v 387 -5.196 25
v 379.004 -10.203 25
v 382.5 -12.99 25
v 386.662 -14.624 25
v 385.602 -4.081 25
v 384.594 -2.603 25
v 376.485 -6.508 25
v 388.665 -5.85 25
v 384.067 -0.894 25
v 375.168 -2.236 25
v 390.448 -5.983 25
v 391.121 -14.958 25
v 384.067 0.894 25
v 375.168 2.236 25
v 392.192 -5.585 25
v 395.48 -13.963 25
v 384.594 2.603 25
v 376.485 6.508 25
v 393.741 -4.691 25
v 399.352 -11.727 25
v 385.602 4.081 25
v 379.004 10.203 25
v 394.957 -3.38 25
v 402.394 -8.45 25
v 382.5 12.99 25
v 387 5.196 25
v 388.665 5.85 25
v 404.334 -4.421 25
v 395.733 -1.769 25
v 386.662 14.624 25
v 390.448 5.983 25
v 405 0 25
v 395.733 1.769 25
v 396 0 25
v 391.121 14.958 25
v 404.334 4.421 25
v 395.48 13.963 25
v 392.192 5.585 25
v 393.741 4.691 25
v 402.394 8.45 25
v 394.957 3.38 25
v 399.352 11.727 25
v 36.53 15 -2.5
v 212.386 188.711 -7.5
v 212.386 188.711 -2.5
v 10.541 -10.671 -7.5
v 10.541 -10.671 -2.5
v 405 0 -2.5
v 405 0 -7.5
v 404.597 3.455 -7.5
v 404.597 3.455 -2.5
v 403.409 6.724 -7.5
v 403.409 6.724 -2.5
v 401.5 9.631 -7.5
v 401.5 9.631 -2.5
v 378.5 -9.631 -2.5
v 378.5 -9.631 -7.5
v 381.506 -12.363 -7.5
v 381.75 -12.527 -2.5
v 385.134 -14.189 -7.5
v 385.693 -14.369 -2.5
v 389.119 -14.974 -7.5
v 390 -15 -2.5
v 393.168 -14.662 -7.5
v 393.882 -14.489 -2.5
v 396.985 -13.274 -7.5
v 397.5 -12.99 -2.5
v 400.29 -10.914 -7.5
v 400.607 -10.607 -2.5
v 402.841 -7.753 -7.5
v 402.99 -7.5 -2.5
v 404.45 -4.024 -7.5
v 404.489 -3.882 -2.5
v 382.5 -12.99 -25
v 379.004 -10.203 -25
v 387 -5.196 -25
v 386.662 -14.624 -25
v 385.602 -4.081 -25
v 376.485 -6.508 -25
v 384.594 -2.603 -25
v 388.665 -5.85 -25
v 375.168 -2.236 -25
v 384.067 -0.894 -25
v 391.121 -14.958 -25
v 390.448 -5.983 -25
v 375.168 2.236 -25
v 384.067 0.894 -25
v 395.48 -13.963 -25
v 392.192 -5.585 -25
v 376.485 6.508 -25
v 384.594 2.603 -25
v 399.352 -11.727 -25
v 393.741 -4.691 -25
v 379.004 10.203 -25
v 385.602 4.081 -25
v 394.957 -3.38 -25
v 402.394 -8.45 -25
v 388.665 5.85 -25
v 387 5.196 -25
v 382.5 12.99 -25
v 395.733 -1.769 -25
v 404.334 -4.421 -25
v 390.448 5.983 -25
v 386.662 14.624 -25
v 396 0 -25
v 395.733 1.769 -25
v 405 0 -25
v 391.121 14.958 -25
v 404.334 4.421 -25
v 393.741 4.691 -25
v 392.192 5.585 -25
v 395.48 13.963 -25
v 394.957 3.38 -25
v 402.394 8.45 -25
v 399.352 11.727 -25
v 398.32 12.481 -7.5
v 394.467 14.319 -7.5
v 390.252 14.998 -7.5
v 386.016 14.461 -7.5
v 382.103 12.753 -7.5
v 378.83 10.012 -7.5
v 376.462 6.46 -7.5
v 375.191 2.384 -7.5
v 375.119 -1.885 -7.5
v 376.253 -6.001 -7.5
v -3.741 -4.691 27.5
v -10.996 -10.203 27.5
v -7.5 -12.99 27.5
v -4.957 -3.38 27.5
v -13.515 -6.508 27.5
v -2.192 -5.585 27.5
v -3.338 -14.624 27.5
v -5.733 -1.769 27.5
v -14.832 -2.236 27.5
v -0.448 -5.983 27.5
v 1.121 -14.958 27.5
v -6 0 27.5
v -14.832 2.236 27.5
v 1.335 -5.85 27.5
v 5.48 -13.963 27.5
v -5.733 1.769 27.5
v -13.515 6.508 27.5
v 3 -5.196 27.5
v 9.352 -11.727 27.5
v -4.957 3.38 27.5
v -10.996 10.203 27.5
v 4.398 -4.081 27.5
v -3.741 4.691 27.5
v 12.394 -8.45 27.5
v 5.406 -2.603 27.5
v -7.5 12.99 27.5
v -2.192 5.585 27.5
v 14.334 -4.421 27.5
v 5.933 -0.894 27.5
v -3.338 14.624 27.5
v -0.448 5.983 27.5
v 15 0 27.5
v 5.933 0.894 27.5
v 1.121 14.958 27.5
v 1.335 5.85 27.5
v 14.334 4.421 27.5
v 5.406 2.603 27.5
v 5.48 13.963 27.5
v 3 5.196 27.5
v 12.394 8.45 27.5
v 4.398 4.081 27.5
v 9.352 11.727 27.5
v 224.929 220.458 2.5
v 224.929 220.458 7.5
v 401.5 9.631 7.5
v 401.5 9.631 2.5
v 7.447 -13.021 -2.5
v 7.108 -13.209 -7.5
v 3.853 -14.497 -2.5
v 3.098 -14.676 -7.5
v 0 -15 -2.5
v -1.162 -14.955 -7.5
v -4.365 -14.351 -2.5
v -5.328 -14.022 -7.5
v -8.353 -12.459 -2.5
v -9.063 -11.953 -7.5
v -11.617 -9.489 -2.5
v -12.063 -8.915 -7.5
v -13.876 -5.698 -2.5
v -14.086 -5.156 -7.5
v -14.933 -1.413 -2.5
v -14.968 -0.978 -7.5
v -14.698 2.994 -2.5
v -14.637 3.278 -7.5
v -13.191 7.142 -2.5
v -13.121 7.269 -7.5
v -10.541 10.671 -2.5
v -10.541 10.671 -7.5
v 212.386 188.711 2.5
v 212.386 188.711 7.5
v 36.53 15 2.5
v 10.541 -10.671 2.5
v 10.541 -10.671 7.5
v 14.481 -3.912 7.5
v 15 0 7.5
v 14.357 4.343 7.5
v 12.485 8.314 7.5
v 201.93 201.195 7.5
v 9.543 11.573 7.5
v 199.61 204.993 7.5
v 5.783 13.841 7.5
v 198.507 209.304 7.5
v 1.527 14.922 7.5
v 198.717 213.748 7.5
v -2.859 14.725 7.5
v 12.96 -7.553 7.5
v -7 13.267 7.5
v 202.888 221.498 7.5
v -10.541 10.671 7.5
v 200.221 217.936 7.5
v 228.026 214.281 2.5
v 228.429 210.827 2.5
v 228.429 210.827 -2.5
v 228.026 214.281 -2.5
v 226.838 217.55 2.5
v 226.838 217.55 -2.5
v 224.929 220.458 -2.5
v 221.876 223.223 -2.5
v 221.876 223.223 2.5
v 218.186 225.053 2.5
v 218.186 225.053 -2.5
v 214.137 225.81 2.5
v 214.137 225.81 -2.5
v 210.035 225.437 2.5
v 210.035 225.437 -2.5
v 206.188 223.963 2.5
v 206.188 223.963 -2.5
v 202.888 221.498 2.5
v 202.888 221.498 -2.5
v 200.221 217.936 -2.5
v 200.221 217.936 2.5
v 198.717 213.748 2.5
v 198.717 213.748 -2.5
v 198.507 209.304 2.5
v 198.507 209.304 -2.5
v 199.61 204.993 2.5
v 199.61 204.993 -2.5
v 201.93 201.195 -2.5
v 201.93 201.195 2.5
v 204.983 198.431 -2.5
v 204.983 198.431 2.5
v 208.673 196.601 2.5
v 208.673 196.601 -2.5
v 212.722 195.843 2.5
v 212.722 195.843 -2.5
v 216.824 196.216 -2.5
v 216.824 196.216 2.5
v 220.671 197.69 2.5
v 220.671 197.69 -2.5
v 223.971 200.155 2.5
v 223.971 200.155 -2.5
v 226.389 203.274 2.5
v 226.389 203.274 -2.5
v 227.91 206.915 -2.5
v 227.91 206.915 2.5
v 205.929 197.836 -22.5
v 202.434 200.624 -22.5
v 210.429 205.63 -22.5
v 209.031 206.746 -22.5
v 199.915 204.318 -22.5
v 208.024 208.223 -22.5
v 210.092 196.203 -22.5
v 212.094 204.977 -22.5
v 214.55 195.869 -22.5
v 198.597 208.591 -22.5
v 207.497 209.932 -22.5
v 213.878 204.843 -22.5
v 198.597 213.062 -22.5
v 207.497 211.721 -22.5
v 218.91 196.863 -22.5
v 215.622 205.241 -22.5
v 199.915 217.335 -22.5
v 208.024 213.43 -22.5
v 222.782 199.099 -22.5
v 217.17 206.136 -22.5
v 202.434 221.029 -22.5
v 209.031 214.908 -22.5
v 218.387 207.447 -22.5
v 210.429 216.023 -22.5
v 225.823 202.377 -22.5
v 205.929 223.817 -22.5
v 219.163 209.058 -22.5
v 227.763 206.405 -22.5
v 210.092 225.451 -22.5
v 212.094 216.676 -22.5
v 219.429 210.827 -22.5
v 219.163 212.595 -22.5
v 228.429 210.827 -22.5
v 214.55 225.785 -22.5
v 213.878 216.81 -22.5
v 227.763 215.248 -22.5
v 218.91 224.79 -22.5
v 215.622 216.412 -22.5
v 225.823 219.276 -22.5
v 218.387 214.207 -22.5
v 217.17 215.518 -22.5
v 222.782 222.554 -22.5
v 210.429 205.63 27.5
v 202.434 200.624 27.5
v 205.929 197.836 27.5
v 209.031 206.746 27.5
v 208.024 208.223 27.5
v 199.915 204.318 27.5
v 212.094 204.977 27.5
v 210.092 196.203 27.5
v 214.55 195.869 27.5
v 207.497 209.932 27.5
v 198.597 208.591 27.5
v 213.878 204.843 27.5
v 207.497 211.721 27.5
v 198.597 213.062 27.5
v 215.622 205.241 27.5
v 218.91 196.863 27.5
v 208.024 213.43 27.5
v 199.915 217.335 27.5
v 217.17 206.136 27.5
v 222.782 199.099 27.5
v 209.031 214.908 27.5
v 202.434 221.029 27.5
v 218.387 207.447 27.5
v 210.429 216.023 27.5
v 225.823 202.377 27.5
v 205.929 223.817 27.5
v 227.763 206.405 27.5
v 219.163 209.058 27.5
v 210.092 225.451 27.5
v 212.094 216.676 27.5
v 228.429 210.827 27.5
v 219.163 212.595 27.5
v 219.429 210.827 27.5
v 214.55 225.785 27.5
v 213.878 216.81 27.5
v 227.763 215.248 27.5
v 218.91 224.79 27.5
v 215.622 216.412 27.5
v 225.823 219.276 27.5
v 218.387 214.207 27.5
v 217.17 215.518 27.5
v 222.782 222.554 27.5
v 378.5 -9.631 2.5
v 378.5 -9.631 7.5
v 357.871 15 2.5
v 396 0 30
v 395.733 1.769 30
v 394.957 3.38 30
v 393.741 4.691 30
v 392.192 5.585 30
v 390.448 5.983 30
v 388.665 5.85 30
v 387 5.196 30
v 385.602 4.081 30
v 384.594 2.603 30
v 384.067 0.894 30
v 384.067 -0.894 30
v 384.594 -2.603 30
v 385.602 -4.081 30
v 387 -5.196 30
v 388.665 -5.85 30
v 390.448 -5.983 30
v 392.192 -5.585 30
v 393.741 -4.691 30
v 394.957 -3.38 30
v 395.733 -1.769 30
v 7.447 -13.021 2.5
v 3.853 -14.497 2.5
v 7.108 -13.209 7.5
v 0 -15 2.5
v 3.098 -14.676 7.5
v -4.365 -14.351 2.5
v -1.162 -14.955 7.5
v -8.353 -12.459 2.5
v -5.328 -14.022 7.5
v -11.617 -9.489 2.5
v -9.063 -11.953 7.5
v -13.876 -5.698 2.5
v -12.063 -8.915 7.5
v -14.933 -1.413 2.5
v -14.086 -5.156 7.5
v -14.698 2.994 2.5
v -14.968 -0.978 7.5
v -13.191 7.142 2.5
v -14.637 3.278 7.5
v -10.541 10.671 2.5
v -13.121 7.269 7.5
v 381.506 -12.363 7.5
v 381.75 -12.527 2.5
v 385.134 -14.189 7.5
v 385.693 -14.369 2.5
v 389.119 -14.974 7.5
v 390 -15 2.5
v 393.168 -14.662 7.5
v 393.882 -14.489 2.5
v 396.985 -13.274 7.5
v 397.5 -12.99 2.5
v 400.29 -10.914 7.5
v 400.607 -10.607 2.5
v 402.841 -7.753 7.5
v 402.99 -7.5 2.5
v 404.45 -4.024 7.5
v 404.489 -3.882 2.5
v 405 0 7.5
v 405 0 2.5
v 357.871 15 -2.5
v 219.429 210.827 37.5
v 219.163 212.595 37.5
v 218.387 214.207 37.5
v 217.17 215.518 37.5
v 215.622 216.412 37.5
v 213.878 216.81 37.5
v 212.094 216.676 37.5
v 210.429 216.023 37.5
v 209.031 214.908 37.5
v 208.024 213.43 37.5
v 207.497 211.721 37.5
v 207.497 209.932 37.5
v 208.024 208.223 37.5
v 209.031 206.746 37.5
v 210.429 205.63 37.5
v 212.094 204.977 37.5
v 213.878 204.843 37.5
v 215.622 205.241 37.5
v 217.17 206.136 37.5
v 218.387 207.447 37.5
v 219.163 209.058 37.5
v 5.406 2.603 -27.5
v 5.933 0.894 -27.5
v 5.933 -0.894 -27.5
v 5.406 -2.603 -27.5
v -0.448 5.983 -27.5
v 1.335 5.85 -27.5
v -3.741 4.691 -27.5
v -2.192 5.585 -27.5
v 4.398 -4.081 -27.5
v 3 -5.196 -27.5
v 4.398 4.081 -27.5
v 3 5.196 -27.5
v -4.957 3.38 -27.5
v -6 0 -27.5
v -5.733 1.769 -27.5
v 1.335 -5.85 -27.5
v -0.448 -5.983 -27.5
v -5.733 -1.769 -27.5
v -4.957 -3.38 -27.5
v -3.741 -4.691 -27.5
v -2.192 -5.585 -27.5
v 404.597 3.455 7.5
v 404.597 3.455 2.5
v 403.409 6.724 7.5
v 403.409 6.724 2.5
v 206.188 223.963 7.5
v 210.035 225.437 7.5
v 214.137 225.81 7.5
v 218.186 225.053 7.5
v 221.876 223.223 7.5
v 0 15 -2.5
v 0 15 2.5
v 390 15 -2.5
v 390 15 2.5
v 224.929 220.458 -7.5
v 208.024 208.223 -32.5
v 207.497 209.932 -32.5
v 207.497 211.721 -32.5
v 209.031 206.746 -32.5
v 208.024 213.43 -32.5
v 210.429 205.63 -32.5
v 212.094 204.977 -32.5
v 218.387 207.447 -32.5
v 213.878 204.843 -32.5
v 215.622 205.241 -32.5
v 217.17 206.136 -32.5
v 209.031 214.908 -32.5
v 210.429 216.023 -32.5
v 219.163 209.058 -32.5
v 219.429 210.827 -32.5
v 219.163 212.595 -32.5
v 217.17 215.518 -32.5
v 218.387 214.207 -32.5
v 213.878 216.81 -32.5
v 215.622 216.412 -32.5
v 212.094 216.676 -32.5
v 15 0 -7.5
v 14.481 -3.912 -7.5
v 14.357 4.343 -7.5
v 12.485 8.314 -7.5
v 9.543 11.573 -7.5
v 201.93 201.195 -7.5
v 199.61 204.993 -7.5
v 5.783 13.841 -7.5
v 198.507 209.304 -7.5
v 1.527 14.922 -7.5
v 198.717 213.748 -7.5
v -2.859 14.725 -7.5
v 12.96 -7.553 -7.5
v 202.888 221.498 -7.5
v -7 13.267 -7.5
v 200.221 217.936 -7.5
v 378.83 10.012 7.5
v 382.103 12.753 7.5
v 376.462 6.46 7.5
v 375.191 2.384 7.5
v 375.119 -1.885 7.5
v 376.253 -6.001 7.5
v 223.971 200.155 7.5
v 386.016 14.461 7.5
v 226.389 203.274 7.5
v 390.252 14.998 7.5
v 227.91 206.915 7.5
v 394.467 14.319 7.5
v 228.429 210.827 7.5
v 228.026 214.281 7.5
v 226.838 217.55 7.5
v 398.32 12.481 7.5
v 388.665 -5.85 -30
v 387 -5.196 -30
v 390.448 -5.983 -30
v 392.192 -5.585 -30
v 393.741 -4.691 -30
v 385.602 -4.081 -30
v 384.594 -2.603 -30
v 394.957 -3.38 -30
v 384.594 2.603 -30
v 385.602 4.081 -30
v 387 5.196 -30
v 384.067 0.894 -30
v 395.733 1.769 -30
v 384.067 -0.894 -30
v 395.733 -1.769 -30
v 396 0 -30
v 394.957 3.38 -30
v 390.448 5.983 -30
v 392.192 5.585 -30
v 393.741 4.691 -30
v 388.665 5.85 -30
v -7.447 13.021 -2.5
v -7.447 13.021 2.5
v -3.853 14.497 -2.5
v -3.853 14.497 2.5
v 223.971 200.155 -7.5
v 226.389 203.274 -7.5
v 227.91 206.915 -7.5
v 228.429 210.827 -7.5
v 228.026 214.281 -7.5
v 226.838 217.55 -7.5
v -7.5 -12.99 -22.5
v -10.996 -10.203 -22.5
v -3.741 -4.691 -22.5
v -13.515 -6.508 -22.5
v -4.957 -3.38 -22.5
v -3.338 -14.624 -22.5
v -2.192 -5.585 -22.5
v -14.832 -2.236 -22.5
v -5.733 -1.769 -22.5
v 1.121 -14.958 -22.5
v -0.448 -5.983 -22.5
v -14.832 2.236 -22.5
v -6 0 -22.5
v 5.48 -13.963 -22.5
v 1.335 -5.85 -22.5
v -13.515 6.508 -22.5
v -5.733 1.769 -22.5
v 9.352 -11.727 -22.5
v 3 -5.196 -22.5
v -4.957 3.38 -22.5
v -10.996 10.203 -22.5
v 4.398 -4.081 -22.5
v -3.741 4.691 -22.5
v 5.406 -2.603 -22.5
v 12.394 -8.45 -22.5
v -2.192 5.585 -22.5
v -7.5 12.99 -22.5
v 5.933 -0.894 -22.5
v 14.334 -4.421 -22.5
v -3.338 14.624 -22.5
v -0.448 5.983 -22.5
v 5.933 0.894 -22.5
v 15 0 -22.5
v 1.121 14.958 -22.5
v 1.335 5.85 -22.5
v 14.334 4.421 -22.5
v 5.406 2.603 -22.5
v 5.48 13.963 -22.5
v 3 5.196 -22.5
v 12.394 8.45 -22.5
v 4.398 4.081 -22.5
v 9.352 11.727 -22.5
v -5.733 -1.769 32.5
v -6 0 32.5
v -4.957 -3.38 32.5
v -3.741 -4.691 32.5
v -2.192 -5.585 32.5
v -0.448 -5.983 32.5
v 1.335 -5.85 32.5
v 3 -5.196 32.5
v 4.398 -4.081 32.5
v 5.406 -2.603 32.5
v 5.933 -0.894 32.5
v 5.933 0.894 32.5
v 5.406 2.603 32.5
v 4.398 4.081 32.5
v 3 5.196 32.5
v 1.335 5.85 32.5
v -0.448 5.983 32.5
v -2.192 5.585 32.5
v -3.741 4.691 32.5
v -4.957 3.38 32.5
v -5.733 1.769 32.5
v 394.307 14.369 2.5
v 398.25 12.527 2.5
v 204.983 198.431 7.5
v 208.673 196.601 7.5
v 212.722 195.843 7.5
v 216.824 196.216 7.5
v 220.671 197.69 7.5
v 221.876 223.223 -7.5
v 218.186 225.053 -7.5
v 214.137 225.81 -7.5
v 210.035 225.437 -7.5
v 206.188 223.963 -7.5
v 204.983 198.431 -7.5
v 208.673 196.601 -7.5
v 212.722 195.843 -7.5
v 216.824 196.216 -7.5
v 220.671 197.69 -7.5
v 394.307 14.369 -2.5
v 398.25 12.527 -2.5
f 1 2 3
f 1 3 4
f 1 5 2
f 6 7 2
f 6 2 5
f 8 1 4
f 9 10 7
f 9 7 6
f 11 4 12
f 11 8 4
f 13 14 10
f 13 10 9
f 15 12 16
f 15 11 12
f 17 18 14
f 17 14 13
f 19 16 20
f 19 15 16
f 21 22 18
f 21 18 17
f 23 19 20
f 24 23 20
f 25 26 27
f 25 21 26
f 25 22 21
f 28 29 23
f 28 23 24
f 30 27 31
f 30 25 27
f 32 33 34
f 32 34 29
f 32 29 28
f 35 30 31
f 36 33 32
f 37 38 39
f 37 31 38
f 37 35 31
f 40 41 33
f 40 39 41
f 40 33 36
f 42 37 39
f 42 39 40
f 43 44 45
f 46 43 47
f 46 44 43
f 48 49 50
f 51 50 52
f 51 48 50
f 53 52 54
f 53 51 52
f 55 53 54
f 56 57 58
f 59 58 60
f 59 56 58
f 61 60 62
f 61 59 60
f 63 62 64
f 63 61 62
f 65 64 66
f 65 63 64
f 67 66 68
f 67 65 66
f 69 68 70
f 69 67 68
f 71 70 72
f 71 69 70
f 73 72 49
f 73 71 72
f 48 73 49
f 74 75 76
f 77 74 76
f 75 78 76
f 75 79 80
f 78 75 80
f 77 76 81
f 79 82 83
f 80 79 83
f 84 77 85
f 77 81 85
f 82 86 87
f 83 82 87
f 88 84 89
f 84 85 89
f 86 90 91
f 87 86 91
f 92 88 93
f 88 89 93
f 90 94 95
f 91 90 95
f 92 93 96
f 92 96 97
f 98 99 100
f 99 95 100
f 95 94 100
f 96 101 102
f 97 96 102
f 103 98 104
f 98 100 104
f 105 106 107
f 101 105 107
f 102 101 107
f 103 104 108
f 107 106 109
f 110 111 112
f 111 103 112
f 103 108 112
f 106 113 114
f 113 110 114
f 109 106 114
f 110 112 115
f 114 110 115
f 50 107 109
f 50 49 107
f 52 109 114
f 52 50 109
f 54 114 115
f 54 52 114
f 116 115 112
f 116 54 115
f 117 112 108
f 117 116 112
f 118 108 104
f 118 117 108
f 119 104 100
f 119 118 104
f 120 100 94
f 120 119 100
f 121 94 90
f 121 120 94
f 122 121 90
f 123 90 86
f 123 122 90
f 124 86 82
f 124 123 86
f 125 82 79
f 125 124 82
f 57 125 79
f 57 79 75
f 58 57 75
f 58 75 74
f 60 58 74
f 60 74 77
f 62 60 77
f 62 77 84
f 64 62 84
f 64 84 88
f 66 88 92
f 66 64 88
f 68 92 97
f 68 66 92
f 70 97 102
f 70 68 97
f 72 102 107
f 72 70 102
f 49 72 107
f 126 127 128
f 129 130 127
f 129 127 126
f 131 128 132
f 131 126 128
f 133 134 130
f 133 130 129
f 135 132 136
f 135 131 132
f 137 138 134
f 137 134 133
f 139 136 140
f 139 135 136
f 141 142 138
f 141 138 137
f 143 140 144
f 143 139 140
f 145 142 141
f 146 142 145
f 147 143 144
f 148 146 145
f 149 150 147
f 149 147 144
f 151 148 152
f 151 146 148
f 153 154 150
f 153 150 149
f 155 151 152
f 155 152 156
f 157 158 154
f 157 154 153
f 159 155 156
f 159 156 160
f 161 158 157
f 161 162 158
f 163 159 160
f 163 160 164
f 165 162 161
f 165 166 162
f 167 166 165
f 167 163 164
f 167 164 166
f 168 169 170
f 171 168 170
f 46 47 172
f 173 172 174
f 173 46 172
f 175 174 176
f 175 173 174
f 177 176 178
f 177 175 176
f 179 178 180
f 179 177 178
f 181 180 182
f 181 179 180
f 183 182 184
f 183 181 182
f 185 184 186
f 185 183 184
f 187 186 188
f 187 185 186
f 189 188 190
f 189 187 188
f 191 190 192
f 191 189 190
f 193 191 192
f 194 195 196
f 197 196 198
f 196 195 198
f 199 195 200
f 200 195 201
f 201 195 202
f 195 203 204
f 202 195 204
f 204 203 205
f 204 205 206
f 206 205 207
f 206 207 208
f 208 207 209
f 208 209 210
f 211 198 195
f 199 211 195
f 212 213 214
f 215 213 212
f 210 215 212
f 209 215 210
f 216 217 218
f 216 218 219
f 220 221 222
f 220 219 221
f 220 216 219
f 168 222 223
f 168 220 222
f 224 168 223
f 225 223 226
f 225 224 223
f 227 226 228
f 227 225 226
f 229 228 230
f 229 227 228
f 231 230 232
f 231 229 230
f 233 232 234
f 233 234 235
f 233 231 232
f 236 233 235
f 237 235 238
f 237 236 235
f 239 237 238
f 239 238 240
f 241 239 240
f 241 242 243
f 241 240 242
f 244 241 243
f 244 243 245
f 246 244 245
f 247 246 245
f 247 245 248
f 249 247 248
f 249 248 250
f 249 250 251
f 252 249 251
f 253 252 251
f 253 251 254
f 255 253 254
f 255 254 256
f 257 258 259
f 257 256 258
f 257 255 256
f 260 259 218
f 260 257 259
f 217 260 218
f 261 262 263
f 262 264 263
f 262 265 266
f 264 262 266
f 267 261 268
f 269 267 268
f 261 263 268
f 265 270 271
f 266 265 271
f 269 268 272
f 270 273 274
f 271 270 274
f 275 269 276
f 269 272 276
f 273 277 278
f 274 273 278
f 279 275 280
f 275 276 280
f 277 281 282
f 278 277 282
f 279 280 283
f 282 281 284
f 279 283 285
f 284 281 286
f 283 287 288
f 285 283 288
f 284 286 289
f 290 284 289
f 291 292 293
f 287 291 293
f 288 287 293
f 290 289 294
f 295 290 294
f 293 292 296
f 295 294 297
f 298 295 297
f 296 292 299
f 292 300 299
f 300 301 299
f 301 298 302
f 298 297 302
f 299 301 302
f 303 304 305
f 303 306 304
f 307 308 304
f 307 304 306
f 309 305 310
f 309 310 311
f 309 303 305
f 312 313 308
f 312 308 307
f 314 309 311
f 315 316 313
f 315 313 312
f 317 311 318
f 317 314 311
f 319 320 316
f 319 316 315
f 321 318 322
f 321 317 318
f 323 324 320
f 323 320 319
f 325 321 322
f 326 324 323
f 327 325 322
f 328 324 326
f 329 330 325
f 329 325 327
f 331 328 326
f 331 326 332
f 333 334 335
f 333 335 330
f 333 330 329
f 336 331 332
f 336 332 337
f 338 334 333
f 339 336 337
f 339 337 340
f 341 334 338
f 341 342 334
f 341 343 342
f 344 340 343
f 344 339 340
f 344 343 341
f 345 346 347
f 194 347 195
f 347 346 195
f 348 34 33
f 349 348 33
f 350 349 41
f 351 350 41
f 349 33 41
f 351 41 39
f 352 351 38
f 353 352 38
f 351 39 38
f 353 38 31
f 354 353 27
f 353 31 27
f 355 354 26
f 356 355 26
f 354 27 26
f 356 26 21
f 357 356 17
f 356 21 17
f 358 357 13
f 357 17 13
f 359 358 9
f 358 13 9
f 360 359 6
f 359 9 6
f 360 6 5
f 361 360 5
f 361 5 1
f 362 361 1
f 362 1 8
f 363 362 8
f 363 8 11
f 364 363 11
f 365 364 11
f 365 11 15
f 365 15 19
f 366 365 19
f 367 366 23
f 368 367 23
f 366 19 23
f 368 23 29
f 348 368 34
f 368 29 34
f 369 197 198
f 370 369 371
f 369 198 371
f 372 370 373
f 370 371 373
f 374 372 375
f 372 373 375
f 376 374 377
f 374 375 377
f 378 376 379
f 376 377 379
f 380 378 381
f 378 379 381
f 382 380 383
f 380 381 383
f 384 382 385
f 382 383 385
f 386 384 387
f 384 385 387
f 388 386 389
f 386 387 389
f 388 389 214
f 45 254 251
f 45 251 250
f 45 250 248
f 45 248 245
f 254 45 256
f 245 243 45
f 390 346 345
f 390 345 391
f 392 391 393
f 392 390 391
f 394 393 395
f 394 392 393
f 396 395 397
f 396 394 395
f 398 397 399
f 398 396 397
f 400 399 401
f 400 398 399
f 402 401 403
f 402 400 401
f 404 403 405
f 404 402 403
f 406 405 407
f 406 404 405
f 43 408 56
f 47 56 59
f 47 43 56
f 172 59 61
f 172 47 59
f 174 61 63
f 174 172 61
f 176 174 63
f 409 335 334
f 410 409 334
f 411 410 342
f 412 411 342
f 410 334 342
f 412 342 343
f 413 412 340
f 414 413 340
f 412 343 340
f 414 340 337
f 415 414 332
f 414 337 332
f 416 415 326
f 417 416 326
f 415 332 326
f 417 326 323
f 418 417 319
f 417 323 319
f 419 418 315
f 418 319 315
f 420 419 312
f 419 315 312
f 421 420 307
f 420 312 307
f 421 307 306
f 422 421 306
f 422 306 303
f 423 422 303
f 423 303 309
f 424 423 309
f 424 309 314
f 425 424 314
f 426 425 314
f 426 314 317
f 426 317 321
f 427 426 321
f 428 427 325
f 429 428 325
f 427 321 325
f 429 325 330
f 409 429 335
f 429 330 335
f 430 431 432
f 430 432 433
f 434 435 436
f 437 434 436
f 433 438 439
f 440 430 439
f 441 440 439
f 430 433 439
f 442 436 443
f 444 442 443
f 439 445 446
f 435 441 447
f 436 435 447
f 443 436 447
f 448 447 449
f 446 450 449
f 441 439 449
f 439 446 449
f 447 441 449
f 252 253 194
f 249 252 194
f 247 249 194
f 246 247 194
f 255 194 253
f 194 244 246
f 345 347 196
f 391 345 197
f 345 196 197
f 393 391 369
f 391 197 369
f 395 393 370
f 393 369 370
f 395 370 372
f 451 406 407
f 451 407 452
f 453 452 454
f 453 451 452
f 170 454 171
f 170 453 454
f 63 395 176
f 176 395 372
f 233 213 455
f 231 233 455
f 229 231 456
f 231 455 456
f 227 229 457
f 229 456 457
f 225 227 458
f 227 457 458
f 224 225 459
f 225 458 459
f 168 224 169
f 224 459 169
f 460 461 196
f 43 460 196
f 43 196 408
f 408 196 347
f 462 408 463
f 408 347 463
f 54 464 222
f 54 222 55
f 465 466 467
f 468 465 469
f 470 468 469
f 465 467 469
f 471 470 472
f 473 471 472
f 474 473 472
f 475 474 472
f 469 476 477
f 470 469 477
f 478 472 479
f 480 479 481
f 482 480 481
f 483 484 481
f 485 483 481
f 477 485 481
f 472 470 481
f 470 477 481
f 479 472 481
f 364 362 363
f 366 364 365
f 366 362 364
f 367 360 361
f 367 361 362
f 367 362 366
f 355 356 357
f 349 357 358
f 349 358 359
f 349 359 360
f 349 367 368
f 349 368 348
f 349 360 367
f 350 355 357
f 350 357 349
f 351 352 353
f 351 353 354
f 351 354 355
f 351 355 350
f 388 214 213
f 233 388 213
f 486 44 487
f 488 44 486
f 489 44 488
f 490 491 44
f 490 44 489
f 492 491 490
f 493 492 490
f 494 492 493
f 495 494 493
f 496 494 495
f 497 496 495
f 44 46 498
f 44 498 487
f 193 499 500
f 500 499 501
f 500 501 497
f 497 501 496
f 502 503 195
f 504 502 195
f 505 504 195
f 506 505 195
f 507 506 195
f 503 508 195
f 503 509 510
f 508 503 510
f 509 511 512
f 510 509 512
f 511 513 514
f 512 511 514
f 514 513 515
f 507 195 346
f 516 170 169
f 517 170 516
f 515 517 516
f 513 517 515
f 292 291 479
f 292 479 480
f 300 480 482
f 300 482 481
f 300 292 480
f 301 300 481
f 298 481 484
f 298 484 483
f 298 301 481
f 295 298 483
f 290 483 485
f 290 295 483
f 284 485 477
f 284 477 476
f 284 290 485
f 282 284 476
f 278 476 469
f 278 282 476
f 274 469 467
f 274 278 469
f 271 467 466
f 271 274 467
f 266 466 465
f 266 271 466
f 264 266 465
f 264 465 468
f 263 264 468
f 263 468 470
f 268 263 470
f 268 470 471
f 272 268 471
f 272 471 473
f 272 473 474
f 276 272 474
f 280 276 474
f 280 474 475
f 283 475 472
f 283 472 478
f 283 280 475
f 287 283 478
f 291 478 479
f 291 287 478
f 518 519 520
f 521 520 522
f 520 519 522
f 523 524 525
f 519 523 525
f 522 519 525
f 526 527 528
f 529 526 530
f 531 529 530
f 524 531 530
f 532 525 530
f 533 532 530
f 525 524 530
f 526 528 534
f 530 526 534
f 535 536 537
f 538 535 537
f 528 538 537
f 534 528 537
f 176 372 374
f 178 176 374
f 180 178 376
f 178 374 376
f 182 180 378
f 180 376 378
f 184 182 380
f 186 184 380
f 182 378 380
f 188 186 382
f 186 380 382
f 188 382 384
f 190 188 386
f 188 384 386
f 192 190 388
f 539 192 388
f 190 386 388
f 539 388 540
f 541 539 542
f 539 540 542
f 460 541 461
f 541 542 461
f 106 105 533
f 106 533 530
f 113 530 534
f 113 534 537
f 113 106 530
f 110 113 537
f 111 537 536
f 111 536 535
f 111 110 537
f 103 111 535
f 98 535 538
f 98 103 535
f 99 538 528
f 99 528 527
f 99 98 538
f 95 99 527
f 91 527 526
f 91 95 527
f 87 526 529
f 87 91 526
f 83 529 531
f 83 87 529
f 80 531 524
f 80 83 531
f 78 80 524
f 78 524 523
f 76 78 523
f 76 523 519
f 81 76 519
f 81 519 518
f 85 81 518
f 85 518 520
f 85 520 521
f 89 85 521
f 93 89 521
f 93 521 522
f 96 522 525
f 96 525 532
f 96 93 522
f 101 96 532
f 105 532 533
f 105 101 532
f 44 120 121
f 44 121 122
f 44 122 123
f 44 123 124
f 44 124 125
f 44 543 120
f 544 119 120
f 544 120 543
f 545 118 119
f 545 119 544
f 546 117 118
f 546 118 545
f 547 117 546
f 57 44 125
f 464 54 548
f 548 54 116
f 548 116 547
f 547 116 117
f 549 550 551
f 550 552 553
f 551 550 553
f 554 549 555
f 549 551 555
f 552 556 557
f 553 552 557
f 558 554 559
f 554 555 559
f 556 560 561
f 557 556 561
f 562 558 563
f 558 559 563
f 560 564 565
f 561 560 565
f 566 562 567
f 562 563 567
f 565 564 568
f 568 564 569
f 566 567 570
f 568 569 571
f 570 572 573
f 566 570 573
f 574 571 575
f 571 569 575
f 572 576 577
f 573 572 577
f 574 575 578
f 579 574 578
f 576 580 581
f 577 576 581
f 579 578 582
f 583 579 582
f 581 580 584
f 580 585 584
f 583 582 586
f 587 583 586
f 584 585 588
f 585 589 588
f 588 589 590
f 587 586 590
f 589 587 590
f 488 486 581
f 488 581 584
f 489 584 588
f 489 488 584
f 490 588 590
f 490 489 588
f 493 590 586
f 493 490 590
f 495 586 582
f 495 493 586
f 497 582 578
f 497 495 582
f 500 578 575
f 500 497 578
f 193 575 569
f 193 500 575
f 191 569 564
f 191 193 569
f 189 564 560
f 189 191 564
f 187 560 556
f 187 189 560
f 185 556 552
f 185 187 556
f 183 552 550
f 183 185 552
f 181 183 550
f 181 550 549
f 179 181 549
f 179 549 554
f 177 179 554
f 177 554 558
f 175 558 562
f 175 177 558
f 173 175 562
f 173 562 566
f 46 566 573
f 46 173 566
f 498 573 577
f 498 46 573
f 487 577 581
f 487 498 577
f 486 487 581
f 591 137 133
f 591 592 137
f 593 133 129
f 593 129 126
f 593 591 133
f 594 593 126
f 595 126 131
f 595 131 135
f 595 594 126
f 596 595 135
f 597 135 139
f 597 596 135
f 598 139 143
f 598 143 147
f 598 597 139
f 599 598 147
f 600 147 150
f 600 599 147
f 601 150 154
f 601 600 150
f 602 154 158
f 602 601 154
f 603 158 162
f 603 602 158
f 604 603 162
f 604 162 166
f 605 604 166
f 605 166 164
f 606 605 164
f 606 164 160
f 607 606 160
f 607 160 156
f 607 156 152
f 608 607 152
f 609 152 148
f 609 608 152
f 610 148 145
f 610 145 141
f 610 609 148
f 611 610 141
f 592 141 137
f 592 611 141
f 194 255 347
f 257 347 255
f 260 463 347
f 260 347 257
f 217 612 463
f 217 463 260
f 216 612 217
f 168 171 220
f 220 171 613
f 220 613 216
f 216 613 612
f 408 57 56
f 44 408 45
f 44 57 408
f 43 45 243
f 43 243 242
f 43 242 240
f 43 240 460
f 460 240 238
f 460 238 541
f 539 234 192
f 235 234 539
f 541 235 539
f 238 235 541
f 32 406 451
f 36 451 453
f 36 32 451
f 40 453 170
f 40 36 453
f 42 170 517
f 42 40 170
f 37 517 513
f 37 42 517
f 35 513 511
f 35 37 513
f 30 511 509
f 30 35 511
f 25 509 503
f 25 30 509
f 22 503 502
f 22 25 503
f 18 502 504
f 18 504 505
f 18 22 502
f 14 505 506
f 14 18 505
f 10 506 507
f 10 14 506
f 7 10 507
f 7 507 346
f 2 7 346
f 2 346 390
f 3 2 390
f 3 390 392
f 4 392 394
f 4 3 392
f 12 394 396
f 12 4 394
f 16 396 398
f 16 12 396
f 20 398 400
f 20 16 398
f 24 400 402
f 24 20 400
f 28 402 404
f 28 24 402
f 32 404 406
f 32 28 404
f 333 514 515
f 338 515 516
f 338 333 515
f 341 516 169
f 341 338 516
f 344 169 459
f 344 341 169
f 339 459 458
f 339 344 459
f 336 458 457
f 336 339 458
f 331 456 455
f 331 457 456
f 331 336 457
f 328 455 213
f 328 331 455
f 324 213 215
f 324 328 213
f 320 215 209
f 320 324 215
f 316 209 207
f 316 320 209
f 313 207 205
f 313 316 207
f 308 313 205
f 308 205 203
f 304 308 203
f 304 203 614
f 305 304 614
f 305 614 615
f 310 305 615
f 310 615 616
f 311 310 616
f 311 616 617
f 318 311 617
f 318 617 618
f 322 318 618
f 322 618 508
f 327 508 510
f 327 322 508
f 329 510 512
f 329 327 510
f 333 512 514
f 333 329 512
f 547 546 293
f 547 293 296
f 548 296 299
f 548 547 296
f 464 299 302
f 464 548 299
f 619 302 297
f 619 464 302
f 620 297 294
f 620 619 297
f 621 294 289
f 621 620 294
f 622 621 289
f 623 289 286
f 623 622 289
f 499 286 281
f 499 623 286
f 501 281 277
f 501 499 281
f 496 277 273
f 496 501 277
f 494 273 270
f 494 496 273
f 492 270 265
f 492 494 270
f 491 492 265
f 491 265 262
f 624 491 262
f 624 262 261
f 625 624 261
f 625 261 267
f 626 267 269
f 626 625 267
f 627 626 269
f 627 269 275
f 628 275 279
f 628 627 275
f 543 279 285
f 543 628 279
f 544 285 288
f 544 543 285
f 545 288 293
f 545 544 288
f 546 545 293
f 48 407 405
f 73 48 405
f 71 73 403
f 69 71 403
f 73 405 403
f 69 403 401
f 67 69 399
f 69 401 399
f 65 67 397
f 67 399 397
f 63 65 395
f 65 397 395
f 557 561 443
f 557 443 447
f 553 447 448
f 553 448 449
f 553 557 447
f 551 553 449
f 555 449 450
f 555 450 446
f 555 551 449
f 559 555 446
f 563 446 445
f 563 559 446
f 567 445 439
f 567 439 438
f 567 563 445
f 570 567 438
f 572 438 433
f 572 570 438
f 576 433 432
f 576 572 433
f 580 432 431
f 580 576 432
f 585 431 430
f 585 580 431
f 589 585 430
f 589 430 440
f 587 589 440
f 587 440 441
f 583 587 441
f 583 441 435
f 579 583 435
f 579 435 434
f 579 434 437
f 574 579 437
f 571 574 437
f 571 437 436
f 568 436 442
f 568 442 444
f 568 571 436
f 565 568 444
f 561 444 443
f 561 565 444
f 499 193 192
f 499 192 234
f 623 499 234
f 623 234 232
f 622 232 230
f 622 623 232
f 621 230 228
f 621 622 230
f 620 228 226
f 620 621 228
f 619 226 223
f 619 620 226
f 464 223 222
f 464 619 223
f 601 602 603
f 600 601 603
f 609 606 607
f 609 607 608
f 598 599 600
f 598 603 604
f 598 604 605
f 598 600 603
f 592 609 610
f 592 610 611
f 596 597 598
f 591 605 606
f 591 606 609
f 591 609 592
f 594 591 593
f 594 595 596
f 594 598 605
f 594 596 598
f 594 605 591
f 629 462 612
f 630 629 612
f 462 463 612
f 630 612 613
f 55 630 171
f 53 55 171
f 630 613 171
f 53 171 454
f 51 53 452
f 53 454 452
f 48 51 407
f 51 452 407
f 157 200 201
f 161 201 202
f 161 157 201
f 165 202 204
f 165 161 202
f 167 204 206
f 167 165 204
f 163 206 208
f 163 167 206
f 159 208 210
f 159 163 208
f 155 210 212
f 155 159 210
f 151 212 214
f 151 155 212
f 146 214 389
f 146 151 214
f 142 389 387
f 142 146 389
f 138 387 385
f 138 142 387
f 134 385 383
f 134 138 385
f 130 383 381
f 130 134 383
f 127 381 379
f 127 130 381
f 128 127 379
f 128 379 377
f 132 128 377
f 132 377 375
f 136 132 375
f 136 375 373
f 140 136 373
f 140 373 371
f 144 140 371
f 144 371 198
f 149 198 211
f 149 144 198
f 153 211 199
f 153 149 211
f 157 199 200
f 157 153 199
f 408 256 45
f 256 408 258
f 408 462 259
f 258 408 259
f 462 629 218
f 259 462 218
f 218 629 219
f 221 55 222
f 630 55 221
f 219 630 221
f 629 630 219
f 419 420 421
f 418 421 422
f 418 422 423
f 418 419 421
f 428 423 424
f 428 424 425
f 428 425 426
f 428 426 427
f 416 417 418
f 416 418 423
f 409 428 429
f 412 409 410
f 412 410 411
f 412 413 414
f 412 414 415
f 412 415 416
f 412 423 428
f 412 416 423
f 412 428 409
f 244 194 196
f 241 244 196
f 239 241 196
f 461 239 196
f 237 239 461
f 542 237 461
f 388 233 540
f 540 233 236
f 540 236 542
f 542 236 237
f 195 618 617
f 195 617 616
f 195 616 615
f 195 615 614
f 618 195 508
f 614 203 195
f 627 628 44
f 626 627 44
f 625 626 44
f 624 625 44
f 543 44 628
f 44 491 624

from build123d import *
from build123d.topology import SkipClean

# Parameters (mm, degrees)
EXTRUDE_1_DEPTH = 2.5
SKETCH_3_R      = 15
EXTRUDE_2_DEPTH = 25
SKETCH_4_R      = 6
EXTRUDE_3_DEPTH = 5
EXTRUDE_START   = 5
EXTRUDE_4_DEPTH = 5
EXTRUDE_5_DEPTH = 5
SKETCH_9_R      = 15
EXTRUDE_8_DEPTH = 25
SKETCH_10_R     = 6
EXTRUDE_9_DEPTH = 30
SKETCH_7_R      = 15
EXTRUDE_6_DEPTH = 25
SKETCH_8_R      = 6
EXTRUDE_7_DEPTH = 10


with BuildPart() as part:
    # 草图1 → 凸台-拉伸1 (new, symmetric)
    with BuildSketch(Plane.XY):
        with BuildLine():
            Line((0, 15), (390, 15))
            ThreePointArc((390, 15), (405, 0), (390, -15))
            Line((390, -15), (0, -15))
            ThreePointArc((0, -15), (-15, 0), (0, 15))
        make_face()
    extrude(amount=EXTRUDE_1_DEPTH, both=True)

    # 草图3 → 凸台-拉伸2 (add, symmetric)
    with SkipClean():  # the faces are left unmerged after this step: merging them gives an invalid solid
        with BuildSketch(Plane.XY):
            with Locations((390, 0)):
                Circle(SKETCH_3_R)
        extrude(amount=EXTRUDE_2_DEPTH, both=True)

    # 草图4 → 凸台-拉伸3 (add)
    with SkipClean():  # the faces are left unmerged after this step: merging them gives an invalid solid
        with BuildSketch(Plane.XY.offset(25)):
            with Locations((390, 0)):
                Circle(SKETCH_4_R)
        extrude_3 = extrude(amount=EXTRUDE_3_DEPTH)

    # 草图5 → 凸台-拉伸4 (add)
    with SkipClean():  # the faces are left unmerged after this step: merging them gives an invalid solid
        with BuildSketch(Plane.XY.offset(2.5).offset(EXTRUDE_START)):
            with BuildLine():
                Line((224.929119743, 220.45771588), (401.499632564, 9.631118881))
                ThreePointArc((401.499632564, 9.631118881), (399.631118881, -11.499632564), (378.500367436, -9.631118881))
                Line((378.500367436, -9.631118881), (201.929854616, 201.195478118))
                ThreePointArc((201.929854616, 201.195478118), (203.798368298, 222.326229563), (224.929119743, 220.45771588))
            make_face()
        extrude_4 = extrude(amount=-EXTRUDE_4_DEPTH)
    add(part.part.scale(1), mode=Mode.REPLACE)  # the faces are merged on a copy

    # 草图6 → 凸台-拉伸5 (add)
    with SkipClean():  # the faces are left unmerged after this step: merging them gives an invalid solid
        with BuildSketch(Plane.XY.offset(2.5).offset(EXTRUDE_START)):
            with BuildLine():
                Line((-10.54132985, 10.671474359), (202.88815733, 221.498071358))
                ThreePointArc((202.88815733, 221.498071358), (224.100961538, 221.367926849), (223.970817029, 200.15512264))
                Line((223.970817029, 200.15512264), (10.54132985, -10.671474359))
                ThreePointArc((10.54132985, -10.671474359), (-10.671474359, -10.54132985), (-10.54132985, 10.671474359))
            make_face()
        extrude_5 = extrude(amount=-EXTRUDE_5_DEPTH)

    # 镜向1: 凸台-拉伸3, 凸台-拉伸4, 凸台-拉伸5 across plane
    with SkipClean():  # the faces are left unmerged after this step: merging them gives an invalid solid
        add(extrude_3.mirror(Plane.XY))
        add(extrude_4.mirror(Plane.XY))
        add(extrude_5.mirror(Plane.XY))

    # 草图9 → 凸台-拉伸8 (add, symmetric)
    with SkipClean():  # the faces are left unmerged after this step: merging them gives an invalid solid
        with BuildSketch(Plane.XY.offset(2.5)):
            Circle(SKETCH_9_R)
        extrude(amount=EXTRUDE_8_DEPTH, both=True)
    add(part.part.scale(1), mode=Mode.REPLACE)  # the faces are merged on a copy

    # 草图10 → 凸台-拉伸9 (add, symmetric)
    with BuildSketch(Plane.XY.offset(2.5)):
        Circle(SKETCH_10_R)
    extrude(amount=EXTRUDE_9_DEPTH, both=True)

    # 草图7 → 凸台-拉伸6 (add, symmetric)
    with SkipClean():  # the faces are left unmerged after this step: merging them gives an invalid solid
        with BuildSketch(Plane.XY.offset(2.5)):
            with Locations((213.429487179, 210.826596999)):
                Circle(SKETCH_7_R)
        extrude(amount=EXTRUDE_6_DEPTH, both=True)

    # 草图8 → 凸台-拉伸7 (add)
    with SkipClean():  # the faces are left unmerged after this step: merging them gives an invalid solid
        with BuildSketch(Plane.XY.offset(27.5)):
            with Locations((213.429487179, 210.826596999)):
                Circle(SKETCH_8_R)
        extrude_7 = extrude(amount=EXTRUDE_7_DEPTH)

    # 镜向2: 凸台-拉伸7 across plane
    with SkipClean():  # the faces are left unmerged after this step: merging them gives an invalid solid
        add(extrude_7.mirror(Plane(origin=(213.429487179, 210.826596999, 2.5), x_dir=(1, 0, 0), z_dir=(0, 0, 1))))


solid = part.part
